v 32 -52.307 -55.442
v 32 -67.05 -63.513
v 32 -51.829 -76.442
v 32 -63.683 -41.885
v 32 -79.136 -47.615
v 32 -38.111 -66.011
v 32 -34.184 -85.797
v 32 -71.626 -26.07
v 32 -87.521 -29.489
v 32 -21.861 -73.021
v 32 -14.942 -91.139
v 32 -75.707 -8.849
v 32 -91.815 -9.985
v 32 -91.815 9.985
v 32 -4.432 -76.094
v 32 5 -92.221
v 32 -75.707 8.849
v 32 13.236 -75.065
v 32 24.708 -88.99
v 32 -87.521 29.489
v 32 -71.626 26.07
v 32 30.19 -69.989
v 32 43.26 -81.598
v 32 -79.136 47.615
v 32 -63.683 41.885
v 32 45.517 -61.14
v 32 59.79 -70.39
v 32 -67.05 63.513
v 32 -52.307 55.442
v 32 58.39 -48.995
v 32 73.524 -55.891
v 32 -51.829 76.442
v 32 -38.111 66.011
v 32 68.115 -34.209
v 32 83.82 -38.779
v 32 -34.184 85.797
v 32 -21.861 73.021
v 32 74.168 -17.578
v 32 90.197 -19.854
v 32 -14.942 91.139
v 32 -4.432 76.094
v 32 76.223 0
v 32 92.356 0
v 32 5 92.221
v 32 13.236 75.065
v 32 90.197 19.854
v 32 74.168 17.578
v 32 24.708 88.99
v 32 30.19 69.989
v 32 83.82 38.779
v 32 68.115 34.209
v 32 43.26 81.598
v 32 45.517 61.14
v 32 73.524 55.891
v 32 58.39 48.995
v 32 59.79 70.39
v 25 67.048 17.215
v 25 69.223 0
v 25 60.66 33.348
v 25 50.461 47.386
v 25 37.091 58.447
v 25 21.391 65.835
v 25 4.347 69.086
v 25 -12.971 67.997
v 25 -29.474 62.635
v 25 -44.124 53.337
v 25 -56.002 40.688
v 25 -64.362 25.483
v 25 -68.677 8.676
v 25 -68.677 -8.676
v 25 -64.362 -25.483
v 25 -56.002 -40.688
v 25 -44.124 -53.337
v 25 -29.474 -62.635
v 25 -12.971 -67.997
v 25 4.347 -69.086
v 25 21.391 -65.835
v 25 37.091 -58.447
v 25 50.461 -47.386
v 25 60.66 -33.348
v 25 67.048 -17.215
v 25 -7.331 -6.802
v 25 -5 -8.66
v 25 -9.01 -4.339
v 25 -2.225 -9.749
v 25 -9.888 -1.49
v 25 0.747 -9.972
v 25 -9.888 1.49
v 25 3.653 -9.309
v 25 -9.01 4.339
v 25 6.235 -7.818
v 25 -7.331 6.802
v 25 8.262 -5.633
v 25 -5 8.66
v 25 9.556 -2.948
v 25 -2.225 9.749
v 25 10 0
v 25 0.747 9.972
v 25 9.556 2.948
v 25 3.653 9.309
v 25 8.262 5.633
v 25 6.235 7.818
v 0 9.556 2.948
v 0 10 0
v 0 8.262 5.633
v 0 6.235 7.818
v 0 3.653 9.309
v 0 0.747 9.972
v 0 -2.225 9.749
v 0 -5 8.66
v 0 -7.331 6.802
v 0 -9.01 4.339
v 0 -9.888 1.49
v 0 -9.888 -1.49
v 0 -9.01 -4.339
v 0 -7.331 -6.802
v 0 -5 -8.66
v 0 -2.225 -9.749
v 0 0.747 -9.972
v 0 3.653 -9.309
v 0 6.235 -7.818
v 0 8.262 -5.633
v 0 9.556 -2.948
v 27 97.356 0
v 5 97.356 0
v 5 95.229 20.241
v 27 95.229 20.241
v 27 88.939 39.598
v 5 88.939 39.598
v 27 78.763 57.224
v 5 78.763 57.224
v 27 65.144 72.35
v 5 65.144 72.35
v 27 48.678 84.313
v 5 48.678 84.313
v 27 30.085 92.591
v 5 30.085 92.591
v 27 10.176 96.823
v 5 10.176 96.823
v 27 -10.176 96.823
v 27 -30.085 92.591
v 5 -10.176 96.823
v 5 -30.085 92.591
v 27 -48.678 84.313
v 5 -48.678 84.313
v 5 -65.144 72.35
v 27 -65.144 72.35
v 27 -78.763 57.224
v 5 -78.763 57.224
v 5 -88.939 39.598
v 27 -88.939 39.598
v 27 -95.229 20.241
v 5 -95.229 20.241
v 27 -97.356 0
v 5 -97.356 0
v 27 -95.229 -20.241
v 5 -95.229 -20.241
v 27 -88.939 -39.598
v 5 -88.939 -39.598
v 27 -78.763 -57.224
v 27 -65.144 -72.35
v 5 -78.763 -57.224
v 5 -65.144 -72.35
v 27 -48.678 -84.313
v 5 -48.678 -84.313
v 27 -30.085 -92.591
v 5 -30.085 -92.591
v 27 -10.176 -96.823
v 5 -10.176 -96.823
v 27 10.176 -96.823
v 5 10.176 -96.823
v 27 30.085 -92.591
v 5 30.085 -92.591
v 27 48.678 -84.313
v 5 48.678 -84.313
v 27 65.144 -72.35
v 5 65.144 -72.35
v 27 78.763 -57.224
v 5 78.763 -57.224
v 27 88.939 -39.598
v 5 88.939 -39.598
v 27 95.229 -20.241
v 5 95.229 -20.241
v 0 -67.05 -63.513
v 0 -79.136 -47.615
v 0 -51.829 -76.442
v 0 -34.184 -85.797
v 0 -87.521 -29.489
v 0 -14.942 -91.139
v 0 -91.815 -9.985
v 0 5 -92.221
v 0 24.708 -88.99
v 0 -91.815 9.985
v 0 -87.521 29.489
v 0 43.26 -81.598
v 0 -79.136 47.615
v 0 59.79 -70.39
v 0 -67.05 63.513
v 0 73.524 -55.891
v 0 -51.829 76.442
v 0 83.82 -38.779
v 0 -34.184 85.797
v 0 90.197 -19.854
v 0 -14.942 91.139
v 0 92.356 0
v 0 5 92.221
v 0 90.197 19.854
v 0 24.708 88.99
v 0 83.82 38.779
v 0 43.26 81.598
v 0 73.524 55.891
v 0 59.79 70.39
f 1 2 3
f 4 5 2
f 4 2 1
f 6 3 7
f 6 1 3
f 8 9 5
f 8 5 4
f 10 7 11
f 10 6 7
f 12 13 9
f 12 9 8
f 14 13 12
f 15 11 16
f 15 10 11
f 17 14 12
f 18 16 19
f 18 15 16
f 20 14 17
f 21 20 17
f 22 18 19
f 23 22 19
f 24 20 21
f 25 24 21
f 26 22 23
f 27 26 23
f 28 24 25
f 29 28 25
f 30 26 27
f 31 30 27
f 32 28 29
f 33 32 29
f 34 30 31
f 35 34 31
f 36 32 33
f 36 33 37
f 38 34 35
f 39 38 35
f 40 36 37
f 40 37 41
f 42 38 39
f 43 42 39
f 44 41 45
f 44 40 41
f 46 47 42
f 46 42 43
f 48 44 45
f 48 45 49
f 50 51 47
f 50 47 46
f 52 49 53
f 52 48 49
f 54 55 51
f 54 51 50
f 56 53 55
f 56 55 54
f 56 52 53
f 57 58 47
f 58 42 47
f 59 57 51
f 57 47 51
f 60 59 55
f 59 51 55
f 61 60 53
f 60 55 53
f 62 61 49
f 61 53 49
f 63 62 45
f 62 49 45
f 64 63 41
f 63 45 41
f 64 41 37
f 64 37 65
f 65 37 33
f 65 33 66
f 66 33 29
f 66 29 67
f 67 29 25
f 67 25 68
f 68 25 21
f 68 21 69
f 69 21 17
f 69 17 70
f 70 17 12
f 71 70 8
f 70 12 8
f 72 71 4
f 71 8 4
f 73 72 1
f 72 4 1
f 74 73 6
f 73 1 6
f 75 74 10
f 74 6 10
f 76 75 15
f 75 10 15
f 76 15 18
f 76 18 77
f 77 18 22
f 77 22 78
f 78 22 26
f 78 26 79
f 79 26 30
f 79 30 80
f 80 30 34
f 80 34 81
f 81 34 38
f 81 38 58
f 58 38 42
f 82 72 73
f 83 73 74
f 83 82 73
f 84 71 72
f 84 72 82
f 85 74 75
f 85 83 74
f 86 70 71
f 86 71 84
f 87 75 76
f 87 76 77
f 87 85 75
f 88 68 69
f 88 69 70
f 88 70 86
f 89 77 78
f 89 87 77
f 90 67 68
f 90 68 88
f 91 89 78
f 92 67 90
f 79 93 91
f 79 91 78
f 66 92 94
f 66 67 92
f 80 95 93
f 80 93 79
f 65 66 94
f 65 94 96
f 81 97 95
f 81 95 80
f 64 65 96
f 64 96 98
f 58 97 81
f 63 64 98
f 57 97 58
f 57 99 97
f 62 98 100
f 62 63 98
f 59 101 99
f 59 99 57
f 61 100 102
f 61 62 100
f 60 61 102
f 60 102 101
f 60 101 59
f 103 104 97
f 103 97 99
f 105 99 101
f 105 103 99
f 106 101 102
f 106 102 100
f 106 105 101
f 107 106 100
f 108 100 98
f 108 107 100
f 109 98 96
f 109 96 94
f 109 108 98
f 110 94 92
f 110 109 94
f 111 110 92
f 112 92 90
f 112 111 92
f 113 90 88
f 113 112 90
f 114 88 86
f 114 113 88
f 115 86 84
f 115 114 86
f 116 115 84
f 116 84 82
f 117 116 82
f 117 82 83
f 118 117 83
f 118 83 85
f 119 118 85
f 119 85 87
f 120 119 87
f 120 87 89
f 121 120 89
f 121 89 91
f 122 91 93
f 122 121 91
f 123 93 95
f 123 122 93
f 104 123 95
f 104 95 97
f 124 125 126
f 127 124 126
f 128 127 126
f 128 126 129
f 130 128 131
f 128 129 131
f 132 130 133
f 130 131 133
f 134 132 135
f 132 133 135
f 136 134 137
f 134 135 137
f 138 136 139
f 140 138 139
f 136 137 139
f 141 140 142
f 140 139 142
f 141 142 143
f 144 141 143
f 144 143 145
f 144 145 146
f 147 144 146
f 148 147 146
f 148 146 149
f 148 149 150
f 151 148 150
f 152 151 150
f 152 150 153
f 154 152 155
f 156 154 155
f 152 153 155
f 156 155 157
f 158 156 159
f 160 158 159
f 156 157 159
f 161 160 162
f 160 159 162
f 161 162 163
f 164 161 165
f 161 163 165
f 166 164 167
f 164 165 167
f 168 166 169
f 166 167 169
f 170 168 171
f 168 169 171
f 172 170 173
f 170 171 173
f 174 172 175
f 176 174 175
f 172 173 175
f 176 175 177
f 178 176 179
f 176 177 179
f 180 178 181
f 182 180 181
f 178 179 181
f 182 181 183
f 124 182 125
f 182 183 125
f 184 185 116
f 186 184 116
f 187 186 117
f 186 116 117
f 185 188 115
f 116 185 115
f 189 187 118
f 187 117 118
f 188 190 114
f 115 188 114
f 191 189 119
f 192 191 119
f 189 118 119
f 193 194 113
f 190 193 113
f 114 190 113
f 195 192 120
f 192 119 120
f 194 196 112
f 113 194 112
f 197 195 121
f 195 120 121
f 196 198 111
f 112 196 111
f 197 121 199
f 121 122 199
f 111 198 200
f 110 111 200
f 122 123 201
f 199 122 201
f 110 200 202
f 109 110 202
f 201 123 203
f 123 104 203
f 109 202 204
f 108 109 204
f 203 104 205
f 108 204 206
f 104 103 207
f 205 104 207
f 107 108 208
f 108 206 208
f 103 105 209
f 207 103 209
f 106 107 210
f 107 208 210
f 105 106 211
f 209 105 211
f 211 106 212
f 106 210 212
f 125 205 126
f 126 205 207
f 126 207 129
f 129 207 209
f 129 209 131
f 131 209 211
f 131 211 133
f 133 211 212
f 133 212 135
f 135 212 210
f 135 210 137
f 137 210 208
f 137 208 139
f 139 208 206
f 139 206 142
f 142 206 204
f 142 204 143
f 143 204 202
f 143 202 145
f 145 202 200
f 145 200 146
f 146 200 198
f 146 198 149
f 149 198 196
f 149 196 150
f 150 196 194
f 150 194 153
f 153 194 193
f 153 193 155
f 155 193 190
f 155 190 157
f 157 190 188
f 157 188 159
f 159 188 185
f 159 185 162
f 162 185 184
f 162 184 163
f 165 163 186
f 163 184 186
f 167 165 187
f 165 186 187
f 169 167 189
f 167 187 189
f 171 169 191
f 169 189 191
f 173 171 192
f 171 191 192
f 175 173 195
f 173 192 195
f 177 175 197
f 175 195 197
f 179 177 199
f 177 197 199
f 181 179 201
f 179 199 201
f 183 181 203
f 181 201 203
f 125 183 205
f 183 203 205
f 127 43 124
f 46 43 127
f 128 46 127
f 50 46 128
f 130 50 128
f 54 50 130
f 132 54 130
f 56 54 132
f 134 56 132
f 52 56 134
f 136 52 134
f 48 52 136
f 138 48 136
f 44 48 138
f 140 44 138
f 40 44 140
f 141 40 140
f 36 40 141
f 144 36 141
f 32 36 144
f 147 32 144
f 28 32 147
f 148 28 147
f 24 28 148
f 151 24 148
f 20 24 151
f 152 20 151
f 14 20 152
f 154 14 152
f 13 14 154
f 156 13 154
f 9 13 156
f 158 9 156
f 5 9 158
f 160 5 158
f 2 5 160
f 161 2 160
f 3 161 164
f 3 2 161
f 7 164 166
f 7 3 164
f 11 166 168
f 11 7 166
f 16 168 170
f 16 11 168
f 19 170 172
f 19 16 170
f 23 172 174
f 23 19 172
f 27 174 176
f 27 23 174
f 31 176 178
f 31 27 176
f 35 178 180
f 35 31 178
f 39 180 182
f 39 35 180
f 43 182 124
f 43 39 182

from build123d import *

# Parameters (mm, degrees)
F0_R     = 66.2228003741
F0_R_2   = 10
F1_DEPTH = 25
F0_R_3   = 97.356020809
F0_R_4   = 74.349079459
F2_DEPTH = 32
F4_SIZE  = 5
F5_SIZE  = 5


# Not quite as in the source:
# - a fillet or chamfer that OpenCascade refuses, or shapes differently, is made with other operations: its cross-section is extruded or revolved along the edge and cut away or added


with BuildPart() as f1:
    # F0 (on Right) → F1 (new body)
    with BuildSketch(Plane.YZ):
        Circle(F0_R)
        Circle(F0_R_2, mode=Mode.SUBTRACT)
    extrude(amount=F1_DEPTH)

    # F0 (on Right) → F2 (join)
    with BuildSketch(Plane.YZ):
        Circle(F0_R_3)
        Circle(F0_R_4, mode=Mode.SUBTRACT)
        Circle(F0_R_4)
        Circle(F0_R, mode=Mode.SUBTRACT)
    extrude(amount=F2_DEPTH)

    # F3: chamfer of 10 on 1 edges, made by hand


with BuildPart() as f3_tool2:
    # F3_s3 → F3_t4 (revolve)
    with BuildSketch(Plane.XY):
        Polygon((22, 66.2228003741), (32, 76.2228003741), (32, 66.2228003741), align=None)
    revolve(axis=Axis((32, 0, 0), (1, 0, 0)))

    split(bisect_by=Plane.YZ.offset(25), keep=Keep.TOP)


with BuildPart() as f1_1:
    add(f1.part)

    # F3_t1: cut F3_tool2
    add(f3_tool2.part, mode=Mode.SUBTRACT)

    # F4
    f4_edges = [f1_1.edges().sort_by_distance(p)[0] for p in [
        (32, -97.356021, 0),
    ]]
    chamfer(f4_edges, length=F4_SIZE)

    # F5
    f5_edges = [f1_1.edges().sort_by_distance(p)[0] for p in [
        (0, -97.356021, 0),
    ]]
    chamfer(f5_edges, length=F5_SIZE)


solid = f1_1.part
